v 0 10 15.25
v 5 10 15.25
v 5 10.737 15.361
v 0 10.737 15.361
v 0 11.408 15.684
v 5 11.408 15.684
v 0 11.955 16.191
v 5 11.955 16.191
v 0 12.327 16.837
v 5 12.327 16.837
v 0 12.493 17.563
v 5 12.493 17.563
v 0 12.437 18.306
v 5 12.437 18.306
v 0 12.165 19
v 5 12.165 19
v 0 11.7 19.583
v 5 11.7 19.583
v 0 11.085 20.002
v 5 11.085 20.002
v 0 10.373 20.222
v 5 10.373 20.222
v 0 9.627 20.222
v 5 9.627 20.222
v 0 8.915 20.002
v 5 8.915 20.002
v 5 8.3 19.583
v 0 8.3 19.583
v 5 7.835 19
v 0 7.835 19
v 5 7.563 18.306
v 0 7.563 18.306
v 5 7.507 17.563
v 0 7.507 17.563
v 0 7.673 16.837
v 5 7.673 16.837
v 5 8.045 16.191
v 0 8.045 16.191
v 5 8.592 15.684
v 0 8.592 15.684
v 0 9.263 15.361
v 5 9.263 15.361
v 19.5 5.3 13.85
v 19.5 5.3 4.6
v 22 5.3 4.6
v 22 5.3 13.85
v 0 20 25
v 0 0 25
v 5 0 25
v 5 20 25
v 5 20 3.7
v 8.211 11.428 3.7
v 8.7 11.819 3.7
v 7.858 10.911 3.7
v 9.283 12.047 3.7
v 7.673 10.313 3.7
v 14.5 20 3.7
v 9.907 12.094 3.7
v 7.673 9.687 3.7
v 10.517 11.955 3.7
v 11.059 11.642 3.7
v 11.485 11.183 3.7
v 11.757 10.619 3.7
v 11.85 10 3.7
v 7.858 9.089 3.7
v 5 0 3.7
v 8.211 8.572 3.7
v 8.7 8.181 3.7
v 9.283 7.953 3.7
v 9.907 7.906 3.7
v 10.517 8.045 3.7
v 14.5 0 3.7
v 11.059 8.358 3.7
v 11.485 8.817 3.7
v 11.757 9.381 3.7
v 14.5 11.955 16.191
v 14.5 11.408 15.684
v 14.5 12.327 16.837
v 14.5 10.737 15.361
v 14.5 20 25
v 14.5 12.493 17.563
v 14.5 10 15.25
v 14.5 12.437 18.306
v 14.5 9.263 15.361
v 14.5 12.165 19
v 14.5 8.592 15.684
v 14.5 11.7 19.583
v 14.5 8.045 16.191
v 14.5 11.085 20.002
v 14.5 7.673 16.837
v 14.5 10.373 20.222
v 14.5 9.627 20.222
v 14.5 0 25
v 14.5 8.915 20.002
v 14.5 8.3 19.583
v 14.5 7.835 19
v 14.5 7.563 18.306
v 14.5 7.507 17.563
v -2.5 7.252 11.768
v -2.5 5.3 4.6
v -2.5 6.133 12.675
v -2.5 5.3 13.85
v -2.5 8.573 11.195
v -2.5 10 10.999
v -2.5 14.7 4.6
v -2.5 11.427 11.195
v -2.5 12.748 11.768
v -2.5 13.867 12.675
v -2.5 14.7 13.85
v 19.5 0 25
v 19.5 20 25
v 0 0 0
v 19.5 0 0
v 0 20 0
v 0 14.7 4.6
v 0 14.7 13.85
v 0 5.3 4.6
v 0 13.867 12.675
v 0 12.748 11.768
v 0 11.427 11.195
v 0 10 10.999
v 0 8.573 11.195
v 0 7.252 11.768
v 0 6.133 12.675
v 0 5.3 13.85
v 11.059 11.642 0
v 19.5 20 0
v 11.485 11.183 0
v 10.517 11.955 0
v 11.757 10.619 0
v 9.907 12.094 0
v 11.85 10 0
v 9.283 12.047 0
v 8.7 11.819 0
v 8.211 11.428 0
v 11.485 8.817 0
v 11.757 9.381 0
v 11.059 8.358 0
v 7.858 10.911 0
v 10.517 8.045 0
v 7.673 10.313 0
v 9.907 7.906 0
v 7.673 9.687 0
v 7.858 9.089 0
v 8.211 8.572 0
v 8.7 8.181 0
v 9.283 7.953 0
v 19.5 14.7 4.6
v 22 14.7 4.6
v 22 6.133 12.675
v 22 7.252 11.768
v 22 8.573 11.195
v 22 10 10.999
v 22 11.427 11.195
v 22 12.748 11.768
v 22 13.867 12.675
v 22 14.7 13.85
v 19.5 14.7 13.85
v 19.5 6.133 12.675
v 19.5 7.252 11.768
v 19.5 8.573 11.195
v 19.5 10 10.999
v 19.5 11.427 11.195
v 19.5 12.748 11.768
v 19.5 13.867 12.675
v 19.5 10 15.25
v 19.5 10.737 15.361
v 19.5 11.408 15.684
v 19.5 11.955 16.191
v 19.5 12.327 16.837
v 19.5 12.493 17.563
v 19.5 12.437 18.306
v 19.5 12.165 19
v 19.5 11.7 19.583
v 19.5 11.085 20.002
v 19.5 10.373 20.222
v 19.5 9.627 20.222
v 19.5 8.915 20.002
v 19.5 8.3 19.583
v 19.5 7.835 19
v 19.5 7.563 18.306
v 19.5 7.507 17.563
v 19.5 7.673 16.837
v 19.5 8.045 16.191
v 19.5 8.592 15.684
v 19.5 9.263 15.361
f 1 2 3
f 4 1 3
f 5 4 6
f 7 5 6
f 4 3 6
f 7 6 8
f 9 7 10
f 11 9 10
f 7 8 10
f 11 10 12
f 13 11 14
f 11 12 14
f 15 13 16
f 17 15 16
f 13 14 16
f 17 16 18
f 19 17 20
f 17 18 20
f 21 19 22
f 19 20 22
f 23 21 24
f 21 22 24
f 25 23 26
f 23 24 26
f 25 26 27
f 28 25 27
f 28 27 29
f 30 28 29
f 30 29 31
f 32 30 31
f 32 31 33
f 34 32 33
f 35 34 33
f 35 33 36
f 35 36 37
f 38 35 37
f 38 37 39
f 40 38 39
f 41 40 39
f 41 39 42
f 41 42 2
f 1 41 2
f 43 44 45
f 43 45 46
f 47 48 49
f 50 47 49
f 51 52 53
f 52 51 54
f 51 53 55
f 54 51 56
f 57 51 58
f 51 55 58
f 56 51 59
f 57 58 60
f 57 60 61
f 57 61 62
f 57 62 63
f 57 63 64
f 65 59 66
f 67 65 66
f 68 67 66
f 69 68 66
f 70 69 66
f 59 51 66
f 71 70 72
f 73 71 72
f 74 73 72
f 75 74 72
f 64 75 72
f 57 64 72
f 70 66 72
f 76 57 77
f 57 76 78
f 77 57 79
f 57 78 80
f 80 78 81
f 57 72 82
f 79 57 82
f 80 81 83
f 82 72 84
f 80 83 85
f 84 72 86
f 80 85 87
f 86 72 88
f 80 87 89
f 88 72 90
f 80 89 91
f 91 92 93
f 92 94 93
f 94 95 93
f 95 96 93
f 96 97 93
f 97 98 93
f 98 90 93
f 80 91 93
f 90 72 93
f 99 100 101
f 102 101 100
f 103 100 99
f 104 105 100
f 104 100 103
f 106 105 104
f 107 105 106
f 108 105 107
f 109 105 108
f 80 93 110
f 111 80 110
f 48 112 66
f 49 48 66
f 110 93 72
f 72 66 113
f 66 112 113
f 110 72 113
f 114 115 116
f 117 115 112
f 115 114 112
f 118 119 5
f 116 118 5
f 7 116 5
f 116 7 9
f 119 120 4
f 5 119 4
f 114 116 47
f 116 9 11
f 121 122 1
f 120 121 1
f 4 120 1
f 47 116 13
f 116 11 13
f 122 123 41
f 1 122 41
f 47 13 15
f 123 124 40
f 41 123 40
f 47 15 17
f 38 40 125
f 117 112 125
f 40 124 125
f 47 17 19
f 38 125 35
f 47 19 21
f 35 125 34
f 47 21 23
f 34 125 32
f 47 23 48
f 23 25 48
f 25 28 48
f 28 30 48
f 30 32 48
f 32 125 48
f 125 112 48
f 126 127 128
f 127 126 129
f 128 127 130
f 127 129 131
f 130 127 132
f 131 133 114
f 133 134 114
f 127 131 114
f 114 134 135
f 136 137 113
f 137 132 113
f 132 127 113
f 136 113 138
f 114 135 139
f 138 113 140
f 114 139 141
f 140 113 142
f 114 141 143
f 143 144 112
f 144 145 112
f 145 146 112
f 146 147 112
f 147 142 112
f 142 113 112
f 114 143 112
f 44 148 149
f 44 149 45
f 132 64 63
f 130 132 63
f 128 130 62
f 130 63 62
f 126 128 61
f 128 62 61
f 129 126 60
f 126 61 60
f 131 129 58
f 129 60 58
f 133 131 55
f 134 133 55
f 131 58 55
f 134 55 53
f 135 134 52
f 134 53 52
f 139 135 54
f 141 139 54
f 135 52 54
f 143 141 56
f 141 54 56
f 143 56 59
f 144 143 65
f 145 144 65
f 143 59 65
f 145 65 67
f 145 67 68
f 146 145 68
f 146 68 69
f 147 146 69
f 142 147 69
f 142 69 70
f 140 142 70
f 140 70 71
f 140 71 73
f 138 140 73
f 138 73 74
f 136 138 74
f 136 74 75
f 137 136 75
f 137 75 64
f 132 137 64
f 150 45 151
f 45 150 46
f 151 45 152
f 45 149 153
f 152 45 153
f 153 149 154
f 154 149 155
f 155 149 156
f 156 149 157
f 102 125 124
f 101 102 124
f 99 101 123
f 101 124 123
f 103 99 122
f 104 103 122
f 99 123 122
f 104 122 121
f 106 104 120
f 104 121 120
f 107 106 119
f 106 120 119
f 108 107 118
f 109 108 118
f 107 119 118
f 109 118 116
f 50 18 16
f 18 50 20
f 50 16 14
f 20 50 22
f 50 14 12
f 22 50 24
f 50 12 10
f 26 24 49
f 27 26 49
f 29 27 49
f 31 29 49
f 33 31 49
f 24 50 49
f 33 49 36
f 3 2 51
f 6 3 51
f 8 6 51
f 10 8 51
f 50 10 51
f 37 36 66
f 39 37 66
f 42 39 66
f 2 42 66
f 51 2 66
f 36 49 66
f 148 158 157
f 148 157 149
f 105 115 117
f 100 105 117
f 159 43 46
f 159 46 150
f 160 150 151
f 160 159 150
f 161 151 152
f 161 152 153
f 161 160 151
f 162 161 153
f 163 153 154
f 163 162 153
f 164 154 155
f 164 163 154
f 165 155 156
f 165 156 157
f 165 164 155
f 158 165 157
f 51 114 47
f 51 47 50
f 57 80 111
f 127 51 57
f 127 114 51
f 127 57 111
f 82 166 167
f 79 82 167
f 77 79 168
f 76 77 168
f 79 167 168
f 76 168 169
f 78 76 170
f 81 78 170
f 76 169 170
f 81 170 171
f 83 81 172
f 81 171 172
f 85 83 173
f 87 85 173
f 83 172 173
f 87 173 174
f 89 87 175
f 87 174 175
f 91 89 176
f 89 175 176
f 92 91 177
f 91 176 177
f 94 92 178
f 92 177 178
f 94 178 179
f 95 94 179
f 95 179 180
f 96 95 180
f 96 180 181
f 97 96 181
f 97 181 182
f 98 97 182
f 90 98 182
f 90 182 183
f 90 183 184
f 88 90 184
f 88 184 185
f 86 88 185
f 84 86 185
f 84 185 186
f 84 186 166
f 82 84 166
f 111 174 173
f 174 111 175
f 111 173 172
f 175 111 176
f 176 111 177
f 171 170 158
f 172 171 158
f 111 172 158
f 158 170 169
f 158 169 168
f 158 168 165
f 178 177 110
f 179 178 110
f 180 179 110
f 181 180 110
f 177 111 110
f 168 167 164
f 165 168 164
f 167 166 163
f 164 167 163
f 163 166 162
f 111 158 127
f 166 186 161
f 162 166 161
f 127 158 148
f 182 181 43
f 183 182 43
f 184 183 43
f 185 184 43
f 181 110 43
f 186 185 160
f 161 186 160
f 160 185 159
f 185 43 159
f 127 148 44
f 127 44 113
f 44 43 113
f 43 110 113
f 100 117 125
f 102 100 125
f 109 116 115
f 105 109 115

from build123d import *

# Parameters (mm, degrees)
BOSS_EXTRUDE1_DEPTH = 20
M5_TAPPED_HOLE1_D   = 4.2
SKETCH5_R           = 2.5
CUT_EXTRUDE1_DEPTH  = 38.486664295
BOSS_EXTRUDE2_DEPTH = 2.5


with BuildPart() as part:
    # Sketch1 → Boss-Extrude1 (new body)
    with BuildSketch(Plane(origin=(0, 0, 0), x_dir=(1, 0, 0), z_dir=(0, 1, 0))):
        Polygon((14.5, -25), (19.5, -25), (19.5, 0), (0, 0), (0, -25), (5, -25), (5, -3.7), (14.5, -3.7), align=None)
    extrude(amount=BOSS_EXTRUDE1_DEPTH)

    # M5 Tapped Hole1 (through all)
    with Locations(Plane(origin=(0, 0, 0), x_dir=(-1, 0, 0), z_dir=(0, 0, -1))):
        with Locations((-9.75, 10)):
            Hole(M5_TAPPED_HOLE1_D / 2)

    # Sketch5 → Cut-Extrude1 (cut, through all)
    with BuildSketch(Plane(origin=(19.5, 0, 0), x_dir=(0, 0, -1), z_dir=(1, 0, 0))):
        with Locations((-17.75, 10)):
            Circle(SKETCH5_R)
    extrude(amount=-CUT_EXTRUDE1_DEPTH, mode=Mode.SUBTRACT)

    # Sketch6 → Boss-Extrude2 (add)
    with BuildSketch(Plane(origin=(19.5, 0, 0), x_dir=(0, 0, -1), z_dir=(1, 0, 0))):
        with BuildLine():
            Line((-13.85, 14.7), (-4.6, 14.7))
            Line((-4.6, 14.7), (-4.6, 5.3))
            Line((-4.6, 5.3), (-13.85, 5.3))
            ThreePointArc((-13.85, 5.3), (-10.999489743, 10), (-13.85, 14.7))
        make_face()
    boss_extrude2 = extrude(amount=BOSS_EXTRUDE2_DEPTH)

    # Mirror1: Boss-Extrude2 across plane
    add(boss_extrude2.mirror(Plane(origin=(9.75, 0, 0), x_dir=(0, 0, 1), z_dir=(1, 0, 0))))


solid = part.part
